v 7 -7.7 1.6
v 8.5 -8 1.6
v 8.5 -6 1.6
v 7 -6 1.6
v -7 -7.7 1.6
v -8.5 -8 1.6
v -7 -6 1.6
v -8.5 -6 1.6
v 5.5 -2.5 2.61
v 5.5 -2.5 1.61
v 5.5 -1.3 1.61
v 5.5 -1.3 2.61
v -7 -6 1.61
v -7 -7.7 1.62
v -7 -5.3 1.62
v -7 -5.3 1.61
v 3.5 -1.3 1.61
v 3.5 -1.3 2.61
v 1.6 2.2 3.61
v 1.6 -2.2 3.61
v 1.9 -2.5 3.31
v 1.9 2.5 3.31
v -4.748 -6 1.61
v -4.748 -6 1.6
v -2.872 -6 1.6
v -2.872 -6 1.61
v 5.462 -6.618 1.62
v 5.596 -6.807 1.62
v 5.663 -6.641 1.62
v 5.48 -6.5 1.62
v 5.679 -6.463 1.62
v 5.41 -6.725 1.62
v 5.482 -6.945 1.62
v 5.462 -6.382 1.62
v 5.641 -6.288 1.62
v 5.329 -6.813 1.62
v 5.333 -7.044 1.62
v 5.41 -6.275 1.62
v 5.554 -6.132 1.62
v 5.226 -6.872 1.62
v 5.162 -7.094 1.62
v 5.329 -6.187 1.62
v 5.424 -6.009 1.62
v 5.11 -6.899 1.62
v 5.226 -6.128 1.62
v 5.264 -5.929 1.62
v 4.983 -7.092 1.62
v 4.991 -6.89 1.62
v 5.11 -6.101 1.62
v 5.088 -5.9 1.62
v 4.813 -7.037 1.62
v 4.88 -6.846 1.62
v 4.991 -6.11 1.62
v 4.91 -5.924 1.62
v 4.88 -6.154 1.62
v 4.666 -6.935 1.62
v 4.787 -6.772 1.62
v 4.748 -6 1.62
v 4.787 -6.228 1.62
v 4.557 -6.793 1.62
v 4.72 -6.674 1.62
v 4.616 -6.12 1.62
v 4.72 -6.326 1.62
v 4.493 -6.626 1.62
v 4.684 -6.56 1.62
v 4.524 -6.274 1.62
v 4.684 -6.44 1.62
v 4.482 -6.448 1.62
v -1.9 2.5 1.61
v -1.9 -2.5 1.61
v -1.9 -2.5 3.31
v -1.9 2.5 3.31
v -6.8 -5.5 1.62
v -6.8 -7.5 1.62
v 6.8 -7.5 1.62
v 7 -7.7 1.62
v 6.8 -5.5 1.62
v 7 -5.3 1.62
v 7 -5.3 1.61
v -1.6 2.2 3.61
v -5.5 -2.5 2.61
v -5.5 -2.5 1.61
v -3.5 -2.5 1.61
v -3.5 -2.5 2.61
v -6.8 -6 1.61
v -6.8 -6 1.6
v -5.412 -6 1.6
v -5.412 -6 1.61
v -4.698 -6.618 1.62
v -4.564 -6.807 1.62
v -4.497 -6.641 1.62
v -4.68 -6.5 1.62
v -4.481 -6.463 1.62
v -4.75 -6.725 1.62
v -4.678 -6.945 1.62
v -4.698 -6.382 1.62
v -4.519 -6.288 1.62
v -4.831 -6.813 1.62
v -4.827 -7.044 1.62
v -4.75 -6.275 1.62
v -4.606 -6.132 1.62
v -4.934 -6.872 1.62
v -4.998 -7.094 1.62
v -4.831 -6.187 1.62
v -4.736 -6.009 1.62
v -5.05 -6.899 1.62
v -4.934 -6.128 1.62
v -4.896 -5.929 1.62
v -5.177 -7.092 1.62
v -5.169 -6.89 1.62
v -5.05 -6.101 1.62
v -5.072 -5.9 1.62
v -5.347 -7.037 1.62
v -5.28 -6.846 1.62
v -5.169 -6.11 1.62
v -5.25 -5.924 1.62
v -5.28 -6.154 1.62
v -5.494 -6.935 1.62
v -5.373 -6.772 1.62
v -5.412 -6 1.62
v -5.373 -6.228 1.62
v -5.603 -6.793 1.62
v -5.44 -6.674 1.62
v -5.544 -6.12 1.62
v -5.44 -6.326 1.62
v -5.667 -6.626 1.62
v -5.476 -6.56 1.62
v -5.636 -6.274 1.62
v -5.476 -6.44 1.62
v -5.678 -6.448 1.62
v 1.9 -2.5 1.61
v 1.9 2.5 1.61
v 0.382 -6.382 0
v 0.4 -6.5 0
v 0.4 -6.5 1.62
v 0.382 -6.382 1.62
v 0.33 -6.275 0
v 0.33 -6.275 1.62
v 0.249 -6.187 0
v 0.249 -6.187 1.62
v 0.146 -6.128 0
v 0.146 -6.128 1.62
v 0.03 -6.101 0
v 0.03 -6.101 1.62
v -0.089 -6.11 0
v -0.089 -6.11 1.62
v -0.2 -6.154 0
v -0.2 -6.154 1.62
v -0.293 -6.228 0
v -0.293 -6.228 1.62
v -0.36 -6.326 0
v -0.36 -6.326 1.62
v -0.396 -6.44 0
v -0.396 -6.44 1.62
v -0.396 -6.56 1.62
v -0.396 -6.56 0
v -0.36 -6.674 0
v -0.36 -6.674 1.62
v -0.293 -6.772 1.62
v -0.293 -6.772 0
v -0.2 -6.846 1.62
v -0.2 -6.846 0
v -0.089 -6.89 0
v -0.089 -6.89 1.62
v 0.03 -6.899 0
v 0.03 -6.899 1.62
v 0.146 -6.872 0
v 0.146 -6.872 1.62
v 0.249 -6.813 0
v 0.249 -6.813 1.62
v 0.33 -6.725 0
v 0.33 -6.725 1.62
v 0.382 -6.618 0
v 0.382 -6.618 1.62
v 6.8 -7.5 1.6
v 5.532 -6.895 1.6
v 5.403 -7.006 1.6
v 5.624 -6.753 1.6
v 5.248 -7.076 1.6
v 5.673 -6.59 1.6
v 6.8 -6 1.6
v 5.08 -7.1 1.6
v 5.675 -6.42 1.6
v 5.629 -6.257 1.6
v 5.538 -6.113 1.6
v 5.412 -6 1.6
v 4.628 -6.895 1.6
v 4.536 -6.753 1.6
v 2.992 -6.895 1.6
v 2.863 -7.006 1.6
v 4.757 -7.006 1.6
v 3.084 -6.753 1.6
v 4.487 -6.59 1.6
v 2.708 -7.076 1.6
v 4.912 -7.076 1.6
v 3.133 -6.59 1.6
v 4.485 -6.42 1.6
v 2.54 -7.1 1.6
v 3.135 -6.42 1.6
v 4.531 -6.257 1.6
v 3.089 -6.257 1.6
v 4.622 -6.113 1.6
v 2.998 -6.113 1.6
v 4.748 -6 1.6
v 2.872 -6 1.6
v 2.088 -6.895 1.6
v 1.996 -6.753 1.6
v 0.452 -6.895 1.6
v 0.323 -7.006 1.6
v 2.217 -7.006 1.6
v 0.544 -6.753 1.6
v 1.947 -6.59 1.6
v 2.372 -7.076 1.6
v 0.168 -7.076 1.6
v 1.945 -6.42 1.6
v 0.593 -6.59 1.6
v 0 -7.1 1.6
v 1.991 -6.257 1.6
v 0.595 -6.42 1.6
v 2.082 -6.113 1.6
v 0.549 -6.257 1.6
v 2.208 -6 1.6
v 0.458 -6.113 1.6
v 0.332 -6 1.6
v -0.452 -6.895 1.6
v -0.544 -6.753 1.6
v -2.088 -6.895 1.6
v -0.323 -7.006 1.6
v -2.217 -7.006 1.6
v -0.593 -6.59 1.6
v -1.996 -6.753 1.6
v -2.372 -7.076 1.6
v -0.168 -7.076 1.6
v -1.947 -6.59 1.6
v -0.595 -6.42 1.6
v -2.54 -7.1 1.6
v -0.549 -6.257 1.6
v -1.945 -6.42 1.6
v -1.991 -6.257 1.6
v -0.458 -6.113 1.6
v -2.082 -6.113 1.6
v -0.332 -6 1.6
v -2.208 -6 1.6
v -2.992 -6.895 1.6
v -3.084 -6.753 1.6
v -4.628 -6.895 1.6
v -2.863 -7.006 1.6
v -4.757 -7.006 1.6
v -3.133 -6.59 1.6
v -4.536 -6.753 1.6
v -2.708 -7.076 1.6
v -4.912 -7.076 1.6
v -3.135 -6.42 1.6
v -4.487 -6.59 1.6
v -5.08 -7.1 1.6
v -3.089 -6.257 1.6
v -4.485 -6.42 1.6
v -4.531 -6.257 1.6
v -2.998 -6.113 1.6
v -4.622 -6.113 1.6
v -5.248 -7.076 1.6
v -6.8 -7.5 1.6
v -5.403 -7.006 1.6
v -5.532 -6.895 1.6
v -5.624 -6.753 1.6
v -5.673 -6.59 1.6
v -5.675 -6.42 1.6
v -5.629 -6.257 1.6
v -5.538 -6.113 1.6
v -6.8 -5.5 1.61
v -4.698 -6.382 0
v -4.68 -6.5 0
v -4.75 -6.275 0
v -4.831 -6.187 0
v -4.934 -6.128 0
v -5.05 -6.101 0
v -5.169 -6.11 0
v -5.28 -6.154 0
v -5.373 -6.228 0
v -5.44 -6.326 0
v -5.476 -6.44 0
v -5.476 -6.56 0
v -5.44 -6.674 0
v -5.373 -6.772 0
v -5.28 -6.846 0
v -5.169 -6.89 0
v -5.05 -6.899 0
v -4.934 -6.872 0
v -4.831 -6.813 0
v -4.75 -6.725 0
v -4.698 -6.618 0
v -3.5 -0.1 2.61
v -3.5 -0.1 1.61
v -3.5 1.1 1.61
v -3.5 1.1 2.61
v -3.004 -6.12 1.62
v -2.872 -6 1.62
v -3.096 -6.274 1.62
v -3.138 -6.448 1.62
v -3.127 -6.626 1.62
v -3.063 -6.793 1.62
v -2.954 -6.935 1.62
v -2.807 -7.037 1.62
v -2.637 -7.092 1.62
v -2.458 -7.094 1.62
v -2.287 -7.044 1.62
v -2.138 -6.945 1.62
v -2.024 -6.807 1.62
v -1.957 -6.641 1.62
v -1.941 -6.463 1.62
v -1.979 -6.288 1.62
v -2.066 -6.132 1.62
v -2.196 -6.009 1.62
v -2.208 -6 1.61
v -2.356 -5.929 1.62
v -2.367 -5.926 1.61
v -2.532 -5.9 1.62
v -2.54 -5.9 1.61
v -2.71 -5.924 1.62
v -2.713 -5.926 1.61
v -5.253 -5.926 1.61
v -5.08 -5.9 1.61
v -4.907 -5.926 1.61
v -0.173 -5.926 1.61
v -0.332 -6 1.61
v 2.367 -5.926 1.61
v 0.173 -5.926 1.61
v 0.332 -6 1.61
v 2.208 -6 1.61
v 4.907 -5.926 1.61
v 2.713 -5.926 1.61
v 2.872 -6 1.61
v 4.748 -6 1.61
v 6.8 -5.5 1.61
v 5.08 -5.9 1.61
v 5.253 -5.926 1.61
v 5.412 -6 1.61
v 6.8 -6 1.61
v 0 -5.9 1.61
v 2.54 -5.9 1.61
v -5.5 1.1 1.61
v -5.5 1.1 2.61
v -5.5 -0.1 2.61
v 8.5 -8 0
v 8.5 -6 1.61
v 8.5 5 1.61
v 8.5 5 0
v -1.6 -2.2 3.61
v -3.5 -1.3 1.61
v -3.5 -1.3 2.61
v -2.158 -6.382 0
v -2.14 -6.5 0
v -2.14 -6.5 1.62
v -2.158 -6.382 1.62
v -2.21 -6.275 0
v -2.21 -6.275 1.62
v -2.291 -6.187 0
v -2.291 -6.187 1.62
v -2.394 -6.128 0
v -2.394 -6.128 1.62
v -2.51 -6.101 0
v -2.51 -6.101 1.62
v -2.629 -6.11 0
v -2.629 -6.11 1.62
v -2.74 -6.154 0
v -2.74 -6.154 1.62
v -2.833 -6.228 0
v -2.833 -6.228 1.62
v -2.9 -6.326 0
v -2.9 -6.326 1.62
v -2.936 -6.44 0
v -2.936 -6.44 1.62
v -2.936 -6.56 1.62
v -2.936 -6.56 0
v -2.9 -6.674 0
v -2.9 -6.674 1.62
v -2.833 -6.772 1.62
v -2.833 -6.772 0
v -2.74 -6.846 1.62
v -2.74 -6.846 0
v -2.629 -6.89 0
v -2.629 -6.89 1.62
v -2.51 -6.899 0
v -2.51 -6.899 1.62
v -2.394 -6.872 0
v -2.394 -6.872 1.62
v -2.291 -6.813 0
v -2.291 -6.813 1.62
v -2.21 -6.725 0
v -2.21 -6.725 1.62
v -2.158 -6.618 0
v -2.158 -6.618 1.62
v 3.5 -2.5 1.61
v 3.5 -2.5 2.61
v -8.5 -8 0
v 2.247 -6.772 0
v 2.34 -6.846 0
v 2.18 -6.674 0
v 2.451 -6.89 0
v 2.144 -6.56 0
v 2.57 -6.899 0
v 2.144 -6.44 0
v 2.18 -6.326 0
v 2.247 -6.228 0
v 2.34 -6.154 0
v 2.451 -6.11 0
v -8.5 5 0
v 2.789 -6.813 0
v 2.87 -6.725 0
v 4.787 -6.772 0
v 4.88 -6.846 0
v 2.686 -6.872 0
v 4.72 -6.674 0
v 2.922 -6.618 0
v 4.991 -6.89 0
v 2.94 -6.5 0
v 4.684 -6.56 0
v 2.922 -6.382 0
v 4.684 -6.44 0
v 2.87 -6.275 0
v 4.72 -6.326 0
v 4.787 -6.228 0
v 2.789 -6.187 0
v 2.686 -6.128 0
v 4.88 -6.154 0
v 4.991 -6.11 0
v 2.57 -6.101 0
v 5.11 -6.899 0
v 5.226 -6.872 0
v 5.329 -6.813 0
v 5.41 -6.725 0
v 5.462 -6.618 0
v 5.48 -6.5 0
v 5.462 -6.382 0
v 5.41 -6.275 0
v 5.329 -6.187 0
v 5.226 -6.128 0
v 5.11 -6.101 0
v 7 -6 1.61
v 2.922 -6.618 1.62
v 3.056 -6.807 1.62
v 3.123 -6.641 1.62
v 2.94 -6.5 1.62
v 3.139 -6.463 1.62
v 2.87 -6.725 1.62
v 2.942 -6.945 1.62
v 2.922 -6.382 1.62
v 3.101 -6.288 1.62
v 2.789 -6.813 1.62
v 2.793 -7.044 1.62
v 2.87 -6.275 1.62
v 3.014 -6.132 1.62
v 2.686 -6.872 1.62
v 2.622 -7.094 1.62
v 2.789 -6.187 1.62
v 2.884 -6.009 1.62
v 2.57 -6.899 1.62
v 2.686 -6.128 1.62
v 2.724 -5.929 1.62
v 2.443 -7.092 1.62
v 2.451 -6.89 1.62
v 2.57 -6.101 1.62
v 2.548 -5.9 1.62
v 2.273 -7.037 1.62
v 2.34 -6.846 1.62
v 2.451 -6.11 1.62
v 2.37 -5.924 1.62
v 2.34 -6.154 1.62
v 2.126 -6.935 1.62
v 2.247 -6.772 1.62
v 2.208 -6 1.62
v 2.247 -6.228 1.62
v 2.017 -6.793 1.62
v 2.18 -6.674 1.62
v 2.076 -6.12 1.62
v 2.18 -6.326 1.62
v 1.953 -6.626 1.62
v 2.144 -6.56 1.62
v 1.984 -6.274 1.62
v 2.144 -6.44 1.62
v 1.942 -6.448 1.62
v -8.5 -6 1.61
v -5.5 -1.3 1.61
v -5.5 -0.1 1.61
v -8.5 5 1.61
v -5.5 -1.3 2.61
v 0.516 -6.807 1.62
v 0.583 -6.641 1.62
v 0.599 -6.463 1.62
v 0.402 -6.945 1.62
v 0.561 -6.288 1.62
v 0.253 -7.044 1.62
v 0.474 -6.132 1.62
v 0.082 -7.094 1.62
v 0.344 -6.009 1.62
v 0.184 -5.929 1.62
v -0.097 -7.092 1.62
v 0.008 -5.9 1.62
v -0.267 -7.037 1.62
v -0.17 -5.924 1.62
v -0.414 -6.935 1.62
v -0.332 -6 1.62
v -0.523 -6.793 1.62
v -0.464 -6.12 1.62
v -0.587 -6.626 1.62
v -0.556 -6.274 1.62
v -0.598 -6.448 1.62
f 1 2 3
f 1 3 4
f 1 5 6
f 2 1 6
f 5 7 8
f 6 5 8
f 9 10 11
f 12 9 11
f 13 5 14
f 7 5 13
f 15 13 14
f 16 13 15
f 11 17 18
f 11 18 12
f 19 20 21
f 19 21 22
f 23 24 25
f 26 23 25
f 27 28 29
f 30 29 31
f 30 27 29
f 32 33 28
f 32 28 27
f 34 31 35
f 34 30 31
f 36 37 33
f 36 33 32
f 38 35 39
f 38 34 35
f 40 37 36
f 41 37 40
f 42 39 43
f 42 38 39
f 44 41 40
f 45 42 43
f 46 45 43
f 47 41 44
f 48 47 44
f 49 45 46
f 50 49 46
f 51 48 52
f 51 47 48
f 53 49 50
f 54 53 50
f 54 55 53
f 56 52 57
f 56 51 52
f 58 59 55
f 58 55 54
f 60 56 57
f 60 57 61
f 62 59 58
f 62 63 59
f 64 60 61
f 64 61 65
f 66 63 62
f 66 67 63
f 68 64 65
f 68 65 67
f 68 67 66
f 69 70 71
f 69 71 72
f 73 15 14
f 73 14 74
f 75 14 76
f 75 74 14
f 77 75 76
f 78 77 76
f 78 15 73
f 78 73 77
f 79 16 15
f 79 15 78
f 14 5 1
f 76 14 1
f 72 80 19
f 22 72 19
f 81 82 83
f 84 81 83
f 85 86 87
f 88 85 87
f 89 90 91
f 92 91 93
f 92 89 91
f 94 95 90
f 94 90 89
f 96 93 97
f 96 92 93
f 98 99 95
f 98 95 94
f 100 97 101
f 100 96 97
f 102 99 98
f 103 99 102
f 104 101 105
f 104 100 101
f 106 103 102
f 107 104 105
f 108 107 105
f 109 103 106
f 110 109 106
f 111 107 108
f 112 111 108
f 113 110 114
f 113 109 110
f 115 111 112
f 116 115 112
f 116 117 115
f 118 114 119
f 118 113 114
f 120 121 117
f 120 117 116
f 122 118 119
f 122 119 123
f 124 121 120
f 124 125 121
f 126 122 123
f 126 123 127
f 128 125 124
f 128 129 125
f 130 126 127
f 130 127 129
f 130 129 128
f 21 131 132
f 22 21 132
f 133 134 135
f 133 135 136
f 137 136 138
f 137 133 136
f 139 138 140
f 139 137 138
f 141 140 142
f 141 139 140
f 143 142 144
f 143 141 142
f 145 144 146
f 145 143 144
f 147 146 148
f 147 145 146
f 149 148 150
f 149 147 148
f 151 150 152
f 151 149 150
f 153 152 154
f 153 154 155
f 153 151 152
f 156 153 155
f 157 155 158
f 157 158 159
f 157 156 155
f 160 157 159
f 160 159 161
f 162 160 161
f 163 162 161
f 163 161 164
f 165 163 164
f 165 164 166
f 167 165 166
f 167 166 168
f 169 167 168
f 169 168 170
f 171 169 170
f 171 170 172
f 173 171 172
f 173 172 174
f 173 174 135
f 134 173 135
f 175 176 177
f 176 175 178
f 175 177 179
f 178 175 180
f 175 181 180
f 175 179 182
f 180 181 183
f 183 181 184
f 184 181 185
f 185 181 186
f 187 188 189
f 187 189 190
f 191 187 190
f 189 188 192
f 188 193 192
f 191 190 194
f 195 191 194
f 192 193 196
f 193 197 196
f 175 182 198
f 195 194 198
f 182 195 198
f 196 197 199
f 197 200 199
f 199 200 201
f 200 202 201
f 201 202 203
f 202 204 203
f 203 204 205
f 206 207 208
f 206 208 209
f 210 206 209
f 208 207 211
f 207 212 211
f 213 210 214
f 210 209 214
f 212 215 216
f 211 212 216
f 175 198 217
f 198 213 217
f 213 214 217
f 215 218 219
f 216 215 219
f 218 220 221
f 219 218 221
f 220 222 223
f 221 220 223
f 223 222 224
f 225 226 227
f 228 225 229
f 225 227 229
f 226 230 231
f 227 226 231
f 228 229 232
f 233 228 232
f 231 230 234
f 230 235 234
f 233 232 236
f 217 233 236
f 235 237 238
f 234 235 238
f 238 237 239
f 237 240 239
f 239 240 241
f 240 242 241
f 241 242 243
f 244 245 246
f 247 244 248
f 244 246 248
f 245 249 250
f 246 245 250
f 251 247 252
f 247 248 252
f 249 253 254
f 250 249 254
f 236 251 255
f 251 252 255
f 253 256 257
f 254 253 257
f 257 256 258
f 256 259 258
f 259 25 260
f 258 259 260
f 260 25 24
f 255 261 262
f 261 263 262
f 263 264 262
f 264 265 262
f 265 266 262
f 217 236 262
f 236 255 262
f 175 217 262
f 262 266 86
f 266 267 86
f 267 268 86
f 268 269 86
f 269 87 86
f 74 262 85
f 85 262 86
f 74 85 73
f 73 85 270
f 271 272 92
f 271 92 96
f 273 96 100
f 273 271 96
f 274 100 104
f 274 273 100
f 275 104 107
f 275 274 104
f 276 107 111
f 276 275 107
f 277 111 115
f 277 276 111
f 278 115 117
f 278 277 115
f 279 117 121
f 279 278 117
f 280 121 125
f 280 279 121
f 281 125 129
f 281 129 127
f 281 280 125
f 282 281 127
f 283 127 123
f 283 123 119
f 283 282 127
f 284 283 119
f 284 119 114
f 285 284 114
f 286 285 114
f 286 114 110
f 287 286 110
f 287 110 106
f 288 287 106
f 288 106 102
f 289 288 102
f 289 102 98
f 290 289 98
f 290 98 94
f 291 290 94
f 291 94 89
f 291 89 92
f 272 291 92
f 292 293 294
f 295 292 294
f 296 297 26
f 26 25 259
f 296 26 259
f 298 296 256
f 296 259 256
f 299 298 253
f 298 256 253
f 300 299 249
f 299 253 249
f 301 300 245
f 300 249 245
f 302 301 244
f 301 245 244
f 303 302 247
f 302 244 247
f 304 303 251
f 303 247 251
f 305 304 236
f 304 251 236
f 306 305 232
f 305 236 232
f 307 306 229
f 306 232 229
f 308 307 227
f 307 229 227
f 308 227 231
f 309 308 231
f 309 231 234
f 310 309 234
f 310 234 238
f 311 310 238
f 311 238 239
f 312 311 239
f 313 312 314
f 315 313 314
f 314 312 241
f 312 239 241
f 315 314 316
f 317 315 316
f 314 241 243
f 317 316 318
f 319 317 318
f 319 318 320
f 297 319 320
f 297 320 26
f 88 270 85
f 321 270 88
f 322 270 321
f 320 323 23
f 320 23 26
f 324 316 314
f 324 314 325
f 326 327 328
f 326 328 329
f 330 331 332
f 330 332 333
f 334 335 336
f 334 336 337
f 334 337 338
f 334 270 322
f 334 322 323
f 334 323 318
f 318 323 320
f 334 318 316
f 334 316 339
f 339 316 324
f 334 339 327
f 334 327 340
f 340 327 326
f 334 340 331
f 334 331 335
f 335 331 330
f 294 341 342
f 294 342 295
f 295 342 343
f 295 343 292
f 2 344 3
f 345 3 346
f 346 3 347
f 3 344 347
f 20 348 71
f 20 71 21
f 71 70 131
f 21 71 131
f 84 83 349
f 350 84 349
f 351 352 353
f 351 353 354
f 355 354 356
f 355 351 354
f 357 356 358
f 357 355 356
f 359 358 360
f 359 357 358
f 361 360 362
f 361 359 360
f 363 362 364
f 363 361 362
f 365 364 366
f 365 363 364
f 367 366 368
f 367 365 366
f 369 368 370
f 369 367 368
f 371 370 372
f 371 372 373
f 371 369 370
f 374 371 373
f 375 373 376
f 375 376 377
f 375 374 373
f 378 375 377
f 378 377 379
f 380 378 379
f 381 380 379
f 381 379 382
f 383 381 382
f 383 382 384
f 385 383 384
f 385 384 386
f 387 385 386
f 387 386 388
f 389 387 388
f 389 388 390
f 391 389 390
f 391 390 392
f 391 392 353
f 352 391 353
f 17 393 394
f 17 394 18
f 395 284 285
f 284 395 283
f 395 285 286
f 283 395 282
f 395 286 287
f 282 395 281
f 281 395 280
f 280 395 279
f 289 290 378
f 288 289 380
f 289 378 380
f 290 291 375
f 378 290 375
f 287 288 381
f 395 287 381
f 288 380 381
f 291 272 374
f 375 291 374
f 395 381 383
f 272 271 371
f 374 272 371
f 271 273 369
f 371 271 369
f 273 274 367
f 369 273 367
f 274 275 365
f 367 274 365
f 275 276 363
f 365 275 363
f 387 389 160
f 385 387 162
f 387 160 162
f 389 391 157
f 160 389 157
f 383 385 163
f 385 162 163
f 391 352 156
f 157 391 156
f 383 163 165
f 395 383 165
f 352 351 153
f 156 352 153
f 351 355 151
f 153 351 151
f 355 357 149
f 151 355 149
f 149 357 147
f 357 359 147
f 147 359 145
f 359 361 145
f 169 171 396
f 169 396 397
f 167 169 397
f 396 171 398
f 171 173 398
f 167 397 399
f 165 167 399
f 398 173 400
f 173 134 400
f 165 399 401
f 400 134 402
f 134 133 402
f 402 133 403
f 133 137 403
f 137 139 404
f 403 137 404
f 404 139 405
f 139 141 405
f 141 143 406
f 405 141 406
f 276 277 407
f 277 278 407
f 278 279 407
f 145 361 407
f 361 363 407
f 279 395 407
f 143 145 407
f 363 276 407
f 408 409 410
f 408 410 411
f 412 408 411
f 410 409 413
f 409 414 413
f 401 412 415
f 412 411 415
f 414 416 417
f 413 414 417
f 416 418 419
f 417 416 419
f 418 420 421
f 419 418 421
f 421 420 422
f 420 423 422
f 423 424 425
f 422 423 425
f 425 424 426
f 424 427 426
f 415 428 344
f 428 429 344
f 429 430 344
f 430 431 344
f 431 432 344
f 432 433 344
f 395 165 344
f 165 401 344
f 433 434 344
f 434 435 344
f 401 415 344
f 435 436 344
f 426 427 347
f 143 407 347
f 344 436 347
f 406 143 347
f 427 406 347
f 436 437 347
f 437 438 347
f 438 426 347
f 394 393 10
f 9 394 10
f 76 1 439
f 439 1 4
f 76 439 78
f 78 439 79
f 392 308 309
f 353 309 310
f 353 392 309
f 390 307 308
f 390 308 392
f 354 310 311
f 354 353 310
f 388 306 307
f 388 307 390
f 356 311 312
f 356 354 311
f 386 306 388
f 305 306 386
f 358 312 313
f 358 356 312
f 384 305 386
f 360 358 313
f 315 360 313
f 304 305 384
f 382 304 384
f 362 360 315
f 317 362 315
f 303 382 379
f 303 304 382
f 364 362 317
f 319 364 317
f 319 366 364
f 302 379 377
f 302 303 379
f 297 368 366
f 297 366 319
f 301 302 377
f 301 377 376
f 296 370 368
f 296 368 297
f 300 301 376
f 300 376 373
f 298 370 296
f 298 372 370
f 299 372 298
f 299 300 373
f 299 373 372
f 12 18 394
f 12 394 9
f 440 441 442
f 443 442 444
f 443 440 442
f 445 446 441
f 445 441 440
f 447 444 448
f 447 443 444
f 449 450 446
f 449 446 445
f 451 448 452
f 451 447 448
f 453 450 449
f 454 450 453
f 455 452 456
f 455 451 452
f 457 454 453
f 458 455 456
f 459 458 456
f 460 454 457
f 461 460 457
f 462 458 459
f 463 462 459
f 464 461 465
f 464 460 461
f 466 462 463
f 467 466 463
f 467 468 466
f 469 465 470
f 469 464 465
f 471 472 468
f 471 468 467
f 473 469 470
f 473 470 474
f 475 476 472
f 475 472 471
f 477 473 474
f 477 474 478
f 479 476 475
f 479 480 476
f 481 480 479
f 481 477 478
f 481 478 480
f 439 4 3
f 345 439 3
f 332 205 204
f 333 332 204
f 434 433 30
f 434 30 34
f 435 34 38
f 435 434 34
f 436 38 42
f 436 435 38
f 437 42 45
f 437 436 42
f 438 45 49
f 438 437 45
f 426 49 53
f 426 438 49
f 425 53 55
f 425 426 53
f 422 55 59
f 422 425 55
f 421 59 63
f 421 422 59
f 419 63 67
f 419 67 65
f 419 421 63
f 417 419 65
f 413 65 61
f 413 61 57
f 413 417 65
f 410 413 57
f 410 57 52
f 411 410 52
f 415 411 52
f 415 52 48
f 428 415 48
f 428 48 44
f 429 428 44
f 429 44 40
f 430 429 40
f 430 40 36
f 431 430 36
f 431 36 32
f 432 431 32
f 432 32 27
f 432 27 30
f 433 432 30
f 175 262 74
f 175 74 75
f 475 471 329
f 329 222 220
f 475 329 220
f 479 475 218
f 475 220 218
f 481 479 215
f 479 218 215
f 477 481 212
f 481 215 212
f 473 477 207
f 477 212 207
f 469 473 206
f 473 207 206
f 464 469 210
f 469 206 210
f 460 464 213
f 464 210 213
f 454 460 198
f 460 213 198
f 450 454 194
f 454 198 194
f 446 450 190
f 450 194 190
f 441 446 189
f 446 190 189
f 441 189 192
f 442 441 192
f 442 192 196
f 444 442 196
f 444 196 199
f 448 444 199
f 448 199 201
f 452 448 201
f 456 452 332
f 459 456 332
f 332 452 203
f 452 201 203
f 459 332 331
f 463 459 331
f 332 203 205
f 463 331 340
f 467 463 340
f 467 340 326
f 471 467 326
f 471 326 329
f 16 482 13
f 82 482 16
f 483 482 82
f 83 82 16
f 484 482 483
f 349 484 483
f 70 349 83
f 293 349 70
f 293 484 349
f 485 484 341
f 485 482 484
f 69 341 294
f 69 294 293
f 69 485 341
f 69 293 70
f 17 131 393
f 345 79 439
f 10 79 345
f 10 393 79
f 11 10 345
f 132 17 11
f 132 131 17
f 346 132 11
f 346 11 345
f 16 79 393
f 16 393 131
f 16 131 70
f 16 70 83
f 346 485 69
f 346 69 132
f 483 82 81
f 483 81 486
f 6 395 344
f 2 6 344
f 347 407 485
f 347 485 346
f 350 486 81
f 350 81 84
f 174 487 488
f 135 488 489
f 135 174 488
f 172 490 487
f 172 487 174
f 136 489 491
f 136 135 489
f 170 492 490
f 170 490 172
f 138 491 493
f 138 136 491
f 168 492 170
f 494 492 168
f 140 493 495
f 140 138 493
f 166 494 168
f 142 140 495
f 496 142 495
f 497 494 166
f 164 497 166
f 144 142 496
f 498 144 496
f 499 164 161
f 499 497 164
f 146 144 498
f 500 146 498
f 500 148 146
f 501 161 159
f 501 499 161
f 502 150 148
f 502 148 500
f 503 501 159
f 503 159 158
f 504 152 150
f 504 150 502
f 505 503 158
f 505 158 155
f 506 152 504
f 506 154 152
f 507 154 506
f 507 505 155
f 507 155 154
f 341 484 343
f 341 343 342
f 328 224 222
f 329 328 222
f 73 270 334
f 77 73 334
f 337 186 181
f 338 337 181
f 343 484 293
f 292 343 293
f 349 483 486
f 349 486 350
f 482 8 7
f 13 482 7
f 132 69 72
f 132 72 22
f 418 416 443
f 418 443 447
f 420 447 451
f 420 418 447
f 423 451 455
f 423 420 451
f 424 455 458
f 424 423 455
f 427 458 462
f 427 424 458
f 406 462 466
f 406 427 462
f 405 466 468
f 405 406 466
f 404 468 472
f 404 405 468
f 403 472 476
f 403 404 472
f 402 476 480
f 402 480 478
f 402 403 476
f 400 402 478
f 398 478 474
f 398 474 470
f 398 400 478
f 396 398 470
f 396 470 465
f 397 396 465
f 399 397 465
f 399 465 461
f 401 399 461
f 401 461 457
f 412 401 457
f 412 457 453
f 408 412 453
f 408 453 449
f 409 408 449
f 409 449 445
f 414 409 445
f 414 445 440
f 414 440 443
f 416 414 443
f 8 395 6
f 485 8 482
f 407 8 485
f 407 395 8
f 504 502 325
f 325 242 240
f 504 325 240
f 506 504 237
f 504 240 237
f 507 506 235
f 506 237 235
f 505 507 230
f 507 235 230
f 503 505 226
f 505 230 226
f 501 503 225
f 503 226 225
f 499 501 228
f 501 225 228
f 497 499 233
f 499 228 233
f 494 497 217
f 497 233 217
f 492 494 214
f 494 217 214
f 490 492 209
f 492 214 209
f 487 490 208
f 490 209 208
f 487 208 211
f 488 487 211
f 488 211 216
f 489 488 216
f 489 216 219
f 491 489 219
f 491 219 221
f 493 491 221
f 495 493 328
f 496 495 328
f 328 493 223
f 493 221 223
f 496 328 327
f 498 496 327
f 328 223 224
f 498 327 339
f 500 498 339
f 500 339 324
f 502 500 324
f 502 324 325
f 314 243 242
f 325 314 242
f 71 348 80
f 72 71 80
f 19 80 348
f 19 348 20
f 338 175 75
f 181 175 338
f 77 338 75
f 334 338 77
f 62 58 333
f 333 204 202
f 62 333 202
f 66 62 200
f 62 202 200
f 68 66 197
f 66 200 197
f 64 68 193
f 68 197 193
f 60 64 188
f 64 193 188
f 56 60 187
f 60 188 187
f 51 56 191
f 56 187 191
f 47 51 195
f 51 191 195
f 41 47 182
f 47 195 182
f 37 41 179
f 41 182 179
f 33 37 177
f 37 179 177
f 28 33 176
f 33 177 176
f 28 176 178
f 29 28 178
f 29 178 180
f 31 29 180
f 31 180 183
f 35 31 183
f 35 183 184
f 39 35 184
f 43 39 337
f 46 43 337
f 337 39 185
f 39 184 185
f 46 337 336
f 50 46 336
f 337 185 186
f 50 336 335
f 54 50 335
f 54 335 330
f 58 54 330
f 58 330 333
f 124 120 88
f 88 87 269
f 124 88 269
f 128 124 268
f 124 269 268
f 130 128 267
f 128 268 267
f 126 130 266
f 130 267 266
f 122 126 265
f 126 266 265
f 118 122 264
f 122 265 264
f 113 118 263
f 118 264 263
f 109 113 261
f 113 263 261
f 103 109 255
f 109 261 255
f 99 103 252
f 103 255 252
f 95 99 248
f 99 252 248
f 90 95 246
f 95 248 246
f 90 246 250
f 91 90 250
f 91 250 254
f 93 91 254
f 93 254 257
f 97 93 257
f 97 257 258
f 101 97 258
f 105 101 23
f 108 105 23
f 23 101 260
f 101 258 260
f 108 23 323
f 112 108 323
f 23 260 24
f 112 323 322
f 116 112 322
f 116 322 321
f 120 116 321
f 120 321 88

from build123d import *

# Parameters (mm, degrees)
BOSS_EXTRUDE1_DEPTH = 1.6
SKETCH2_W           = 17
SKETCH2_H           = 12
BOSS_EXTRUDE2_DEPTH = 1.61
SKETCH3_W           = 14
SKETCH3_H           = 2.4
SKETCH3_W_2         = 13.6
SKETCH3_H_2         = 2
SKETCH3_R           = 0.6
SKETCH3_R_2         = 0.4
BOSS_EXTRUDE3_DEPTH = 1.62
SKETCH3_3_R         = 0.4
CUT_EXTRUDE1_DEPTH  = 2.62
BOSS_EXTRUDE4_START = 1.61
SKETCH4_W           = 3.8
SKETCH4_H           = 5
BOSS_EXTRUDE4_DEPTH = 2
BOSS_EXTRUDE5_START = 1.61
SKETCH5_W           = 2
SKETCH5_H           = 1.2
BOSS_EXTRUDE5_DEPTH = 1
CHAMFER1_SIZE       = 0.3
SKETCH8_W           = 27
SKETCH8_H           = 26
SKETCH8_W_2         = 17
SKETCH8_H_2         = 16
CUT_EXTRUDE9_DEPTH  = 3
SKETCH9_W           = 17
SKETCH9_H           = 3
CUT_EXTRUDE11_DEPTH = 2


with BuildPart() as part:
    # Sketch1 → Boss-Extrude1 (new body)
    with BuildSketch(Plane.XY):
        Polygon((-11.5, 9.5), (-9.5, 11.5), (9.5, 11.5), (11.5, 9.5), (11.5, -9.5), (9.5, -11.5), (-9.5, -11.5), (-11.5, -9.5), align=None)
    extrude(amount=BOSS_EXTRUDE1_DEPTH)

    # Sketch2 → Boss-Extrude2 (add)
    with BuildSketch(Plane.XY):
        Rectangle(SKETCH2_W, SKETCH2_H)
    extrude(amount=BOSS_EXTRUDE2_DEPTH)

    # Sketch3 → Boss-Extrude3 (add)
    with BuildSketch(Plane.XY):
        with Locations((0, -6.5)):
            Rectangle(SKETCH3_W, SKETCH3_H)
        with Locations((0, -6.5)):
            Rectangle(SKETCH3_W_2, SKETCH3_H_2, mode=Mode.SUBTRACT)
        with Locations(Location((-5.08, -6.5, 0), (0, 0, 123.557309762))):
            Circle(SKETCH3_R)
        with Locations((-5.08, -6.5)):
            Circle(SKETCH3_R_2, mode=Mode.SUBTRACT)
        with Locations(Location((-2.54, -6.5, 0), (0, 0, 123.557309762))):
            Circle(SKETCH3_R)
        with Locations((-2.54, -6.5)):
            Circle(SKETCH3_R_2, mode=Mode.SUBTRACT)
        with Locations(Location((0, -6.5, 0), (0, 0, 123.557309762))):
            Circle(SKETCH3_R)
        with Locations((0, -6.5)):
            Circle(SKETCH3_R_2, mode=Mode.SUBTRACT)
        with Locations(Location((5.08, -6.5, 0), (0, 0, 123.557309762))):
            Circle(SKETCH3_R)
        with Locations((5.08, -6.5)):
            Circle(SKETCH3_R_2, mode=Mode.SUBTRACT)
        with Locations(Location((2.54, -6.5, 0), (0, 0, 123.557309762))):
            Circle(SKETCH3_R)
        with Locations((2.54, -6.5)):
            Circle(SKETCH3_R_2, mode=Mode.SUBTRACT)
    extrude(amount=BOSS_EXTRUDE3_DEPTH)

    # Sketch3<3> → Cut-Extrude1 (cut)
    with BuildSketch(Plane.XY):
        with Locations((-5.08, -6.5)):
            Circle(SKETCH3_3_R)
        with Locations((-2.54, -6.5)):
            Circle(SKETCH3_3_R)
        with Locations((0, -6.5)):
            Circle(SKETCH3_3_R)
        with Locations((2.54, -6.5)):
            Circle(SKETCH3_3_R)
        with Locations((5.08, -6.5)):
            Circle(SKETCH3_3_R)
    extrude(amount=CUT_EXTRUDE1_DEPTH, mode=Mode.SUBTRACT)

    # Sketch4 → Boss-Extrude4 (add)
    with BuildSketch(Plane.XY.offset(BOSS_EXTRUDE4_START)):
        Rectangle(SKETCH4_W, SKETCH4_H)
    extrude(amount=BOSS_EXTRUDE4_DEPTH)

    # Sketch5 → Boss-Extrude5 (add)
    with BuildSketch(Plane.XY.offset(BOSS_EXTRUDE5_START)):
        with Locations((-4.500129294, -1.9)):
            Rectangle(SKETCH5_W, SKETCH5_H)
        with Locations((-4.5, 0.5)):
            Rectangle(SKETCH5_W, SKETCH5_H)
        with Locations((4.5, -1.9)):
            Rectangle(SKETCH5_W, SKETCH5_H)
    extrude(amount=BOSS_EXTRUDE5_DEPTH)

    # Chamfer1
    chamfer1_edges = [part.edges().sort_by_distance(p)[0] for p in [
        (1.9, 0, 3.61),
        (0, 2.5, 3.61),
        (-1.9, 0, 3.61),
        (0, -2.5, 3.61),
    ]]
    chamfer(chamfer1_edges, length=CHAMFER1_SIZE)

    # Sketch8 → Cut-Extrude9 (cut)
    with BuildSketch(Plane.XY):
        Rectangle(SKETCH8_W, SKETCH8_H)
        Rectangle(SKETCH8_W_2, SKETCH8_H_2, mode=Mode.SUBTRACT)
    extrude(amount=CUT_EXTRUDE9_DEPTH, mode=Mode.SUBTRACT)

    # Sketch9 → Cut-Extrude11 (cut)
    with BuildSketch(Plane.XY):
        with Locations((0, 6.5)):
            Rectangle(SKETCH9_W, SKETCH9_H)
    extrude(amount=CUT_EXTRUDE11_DEPTH, mode=Mode.SUBTRACT)


solid = part.part
